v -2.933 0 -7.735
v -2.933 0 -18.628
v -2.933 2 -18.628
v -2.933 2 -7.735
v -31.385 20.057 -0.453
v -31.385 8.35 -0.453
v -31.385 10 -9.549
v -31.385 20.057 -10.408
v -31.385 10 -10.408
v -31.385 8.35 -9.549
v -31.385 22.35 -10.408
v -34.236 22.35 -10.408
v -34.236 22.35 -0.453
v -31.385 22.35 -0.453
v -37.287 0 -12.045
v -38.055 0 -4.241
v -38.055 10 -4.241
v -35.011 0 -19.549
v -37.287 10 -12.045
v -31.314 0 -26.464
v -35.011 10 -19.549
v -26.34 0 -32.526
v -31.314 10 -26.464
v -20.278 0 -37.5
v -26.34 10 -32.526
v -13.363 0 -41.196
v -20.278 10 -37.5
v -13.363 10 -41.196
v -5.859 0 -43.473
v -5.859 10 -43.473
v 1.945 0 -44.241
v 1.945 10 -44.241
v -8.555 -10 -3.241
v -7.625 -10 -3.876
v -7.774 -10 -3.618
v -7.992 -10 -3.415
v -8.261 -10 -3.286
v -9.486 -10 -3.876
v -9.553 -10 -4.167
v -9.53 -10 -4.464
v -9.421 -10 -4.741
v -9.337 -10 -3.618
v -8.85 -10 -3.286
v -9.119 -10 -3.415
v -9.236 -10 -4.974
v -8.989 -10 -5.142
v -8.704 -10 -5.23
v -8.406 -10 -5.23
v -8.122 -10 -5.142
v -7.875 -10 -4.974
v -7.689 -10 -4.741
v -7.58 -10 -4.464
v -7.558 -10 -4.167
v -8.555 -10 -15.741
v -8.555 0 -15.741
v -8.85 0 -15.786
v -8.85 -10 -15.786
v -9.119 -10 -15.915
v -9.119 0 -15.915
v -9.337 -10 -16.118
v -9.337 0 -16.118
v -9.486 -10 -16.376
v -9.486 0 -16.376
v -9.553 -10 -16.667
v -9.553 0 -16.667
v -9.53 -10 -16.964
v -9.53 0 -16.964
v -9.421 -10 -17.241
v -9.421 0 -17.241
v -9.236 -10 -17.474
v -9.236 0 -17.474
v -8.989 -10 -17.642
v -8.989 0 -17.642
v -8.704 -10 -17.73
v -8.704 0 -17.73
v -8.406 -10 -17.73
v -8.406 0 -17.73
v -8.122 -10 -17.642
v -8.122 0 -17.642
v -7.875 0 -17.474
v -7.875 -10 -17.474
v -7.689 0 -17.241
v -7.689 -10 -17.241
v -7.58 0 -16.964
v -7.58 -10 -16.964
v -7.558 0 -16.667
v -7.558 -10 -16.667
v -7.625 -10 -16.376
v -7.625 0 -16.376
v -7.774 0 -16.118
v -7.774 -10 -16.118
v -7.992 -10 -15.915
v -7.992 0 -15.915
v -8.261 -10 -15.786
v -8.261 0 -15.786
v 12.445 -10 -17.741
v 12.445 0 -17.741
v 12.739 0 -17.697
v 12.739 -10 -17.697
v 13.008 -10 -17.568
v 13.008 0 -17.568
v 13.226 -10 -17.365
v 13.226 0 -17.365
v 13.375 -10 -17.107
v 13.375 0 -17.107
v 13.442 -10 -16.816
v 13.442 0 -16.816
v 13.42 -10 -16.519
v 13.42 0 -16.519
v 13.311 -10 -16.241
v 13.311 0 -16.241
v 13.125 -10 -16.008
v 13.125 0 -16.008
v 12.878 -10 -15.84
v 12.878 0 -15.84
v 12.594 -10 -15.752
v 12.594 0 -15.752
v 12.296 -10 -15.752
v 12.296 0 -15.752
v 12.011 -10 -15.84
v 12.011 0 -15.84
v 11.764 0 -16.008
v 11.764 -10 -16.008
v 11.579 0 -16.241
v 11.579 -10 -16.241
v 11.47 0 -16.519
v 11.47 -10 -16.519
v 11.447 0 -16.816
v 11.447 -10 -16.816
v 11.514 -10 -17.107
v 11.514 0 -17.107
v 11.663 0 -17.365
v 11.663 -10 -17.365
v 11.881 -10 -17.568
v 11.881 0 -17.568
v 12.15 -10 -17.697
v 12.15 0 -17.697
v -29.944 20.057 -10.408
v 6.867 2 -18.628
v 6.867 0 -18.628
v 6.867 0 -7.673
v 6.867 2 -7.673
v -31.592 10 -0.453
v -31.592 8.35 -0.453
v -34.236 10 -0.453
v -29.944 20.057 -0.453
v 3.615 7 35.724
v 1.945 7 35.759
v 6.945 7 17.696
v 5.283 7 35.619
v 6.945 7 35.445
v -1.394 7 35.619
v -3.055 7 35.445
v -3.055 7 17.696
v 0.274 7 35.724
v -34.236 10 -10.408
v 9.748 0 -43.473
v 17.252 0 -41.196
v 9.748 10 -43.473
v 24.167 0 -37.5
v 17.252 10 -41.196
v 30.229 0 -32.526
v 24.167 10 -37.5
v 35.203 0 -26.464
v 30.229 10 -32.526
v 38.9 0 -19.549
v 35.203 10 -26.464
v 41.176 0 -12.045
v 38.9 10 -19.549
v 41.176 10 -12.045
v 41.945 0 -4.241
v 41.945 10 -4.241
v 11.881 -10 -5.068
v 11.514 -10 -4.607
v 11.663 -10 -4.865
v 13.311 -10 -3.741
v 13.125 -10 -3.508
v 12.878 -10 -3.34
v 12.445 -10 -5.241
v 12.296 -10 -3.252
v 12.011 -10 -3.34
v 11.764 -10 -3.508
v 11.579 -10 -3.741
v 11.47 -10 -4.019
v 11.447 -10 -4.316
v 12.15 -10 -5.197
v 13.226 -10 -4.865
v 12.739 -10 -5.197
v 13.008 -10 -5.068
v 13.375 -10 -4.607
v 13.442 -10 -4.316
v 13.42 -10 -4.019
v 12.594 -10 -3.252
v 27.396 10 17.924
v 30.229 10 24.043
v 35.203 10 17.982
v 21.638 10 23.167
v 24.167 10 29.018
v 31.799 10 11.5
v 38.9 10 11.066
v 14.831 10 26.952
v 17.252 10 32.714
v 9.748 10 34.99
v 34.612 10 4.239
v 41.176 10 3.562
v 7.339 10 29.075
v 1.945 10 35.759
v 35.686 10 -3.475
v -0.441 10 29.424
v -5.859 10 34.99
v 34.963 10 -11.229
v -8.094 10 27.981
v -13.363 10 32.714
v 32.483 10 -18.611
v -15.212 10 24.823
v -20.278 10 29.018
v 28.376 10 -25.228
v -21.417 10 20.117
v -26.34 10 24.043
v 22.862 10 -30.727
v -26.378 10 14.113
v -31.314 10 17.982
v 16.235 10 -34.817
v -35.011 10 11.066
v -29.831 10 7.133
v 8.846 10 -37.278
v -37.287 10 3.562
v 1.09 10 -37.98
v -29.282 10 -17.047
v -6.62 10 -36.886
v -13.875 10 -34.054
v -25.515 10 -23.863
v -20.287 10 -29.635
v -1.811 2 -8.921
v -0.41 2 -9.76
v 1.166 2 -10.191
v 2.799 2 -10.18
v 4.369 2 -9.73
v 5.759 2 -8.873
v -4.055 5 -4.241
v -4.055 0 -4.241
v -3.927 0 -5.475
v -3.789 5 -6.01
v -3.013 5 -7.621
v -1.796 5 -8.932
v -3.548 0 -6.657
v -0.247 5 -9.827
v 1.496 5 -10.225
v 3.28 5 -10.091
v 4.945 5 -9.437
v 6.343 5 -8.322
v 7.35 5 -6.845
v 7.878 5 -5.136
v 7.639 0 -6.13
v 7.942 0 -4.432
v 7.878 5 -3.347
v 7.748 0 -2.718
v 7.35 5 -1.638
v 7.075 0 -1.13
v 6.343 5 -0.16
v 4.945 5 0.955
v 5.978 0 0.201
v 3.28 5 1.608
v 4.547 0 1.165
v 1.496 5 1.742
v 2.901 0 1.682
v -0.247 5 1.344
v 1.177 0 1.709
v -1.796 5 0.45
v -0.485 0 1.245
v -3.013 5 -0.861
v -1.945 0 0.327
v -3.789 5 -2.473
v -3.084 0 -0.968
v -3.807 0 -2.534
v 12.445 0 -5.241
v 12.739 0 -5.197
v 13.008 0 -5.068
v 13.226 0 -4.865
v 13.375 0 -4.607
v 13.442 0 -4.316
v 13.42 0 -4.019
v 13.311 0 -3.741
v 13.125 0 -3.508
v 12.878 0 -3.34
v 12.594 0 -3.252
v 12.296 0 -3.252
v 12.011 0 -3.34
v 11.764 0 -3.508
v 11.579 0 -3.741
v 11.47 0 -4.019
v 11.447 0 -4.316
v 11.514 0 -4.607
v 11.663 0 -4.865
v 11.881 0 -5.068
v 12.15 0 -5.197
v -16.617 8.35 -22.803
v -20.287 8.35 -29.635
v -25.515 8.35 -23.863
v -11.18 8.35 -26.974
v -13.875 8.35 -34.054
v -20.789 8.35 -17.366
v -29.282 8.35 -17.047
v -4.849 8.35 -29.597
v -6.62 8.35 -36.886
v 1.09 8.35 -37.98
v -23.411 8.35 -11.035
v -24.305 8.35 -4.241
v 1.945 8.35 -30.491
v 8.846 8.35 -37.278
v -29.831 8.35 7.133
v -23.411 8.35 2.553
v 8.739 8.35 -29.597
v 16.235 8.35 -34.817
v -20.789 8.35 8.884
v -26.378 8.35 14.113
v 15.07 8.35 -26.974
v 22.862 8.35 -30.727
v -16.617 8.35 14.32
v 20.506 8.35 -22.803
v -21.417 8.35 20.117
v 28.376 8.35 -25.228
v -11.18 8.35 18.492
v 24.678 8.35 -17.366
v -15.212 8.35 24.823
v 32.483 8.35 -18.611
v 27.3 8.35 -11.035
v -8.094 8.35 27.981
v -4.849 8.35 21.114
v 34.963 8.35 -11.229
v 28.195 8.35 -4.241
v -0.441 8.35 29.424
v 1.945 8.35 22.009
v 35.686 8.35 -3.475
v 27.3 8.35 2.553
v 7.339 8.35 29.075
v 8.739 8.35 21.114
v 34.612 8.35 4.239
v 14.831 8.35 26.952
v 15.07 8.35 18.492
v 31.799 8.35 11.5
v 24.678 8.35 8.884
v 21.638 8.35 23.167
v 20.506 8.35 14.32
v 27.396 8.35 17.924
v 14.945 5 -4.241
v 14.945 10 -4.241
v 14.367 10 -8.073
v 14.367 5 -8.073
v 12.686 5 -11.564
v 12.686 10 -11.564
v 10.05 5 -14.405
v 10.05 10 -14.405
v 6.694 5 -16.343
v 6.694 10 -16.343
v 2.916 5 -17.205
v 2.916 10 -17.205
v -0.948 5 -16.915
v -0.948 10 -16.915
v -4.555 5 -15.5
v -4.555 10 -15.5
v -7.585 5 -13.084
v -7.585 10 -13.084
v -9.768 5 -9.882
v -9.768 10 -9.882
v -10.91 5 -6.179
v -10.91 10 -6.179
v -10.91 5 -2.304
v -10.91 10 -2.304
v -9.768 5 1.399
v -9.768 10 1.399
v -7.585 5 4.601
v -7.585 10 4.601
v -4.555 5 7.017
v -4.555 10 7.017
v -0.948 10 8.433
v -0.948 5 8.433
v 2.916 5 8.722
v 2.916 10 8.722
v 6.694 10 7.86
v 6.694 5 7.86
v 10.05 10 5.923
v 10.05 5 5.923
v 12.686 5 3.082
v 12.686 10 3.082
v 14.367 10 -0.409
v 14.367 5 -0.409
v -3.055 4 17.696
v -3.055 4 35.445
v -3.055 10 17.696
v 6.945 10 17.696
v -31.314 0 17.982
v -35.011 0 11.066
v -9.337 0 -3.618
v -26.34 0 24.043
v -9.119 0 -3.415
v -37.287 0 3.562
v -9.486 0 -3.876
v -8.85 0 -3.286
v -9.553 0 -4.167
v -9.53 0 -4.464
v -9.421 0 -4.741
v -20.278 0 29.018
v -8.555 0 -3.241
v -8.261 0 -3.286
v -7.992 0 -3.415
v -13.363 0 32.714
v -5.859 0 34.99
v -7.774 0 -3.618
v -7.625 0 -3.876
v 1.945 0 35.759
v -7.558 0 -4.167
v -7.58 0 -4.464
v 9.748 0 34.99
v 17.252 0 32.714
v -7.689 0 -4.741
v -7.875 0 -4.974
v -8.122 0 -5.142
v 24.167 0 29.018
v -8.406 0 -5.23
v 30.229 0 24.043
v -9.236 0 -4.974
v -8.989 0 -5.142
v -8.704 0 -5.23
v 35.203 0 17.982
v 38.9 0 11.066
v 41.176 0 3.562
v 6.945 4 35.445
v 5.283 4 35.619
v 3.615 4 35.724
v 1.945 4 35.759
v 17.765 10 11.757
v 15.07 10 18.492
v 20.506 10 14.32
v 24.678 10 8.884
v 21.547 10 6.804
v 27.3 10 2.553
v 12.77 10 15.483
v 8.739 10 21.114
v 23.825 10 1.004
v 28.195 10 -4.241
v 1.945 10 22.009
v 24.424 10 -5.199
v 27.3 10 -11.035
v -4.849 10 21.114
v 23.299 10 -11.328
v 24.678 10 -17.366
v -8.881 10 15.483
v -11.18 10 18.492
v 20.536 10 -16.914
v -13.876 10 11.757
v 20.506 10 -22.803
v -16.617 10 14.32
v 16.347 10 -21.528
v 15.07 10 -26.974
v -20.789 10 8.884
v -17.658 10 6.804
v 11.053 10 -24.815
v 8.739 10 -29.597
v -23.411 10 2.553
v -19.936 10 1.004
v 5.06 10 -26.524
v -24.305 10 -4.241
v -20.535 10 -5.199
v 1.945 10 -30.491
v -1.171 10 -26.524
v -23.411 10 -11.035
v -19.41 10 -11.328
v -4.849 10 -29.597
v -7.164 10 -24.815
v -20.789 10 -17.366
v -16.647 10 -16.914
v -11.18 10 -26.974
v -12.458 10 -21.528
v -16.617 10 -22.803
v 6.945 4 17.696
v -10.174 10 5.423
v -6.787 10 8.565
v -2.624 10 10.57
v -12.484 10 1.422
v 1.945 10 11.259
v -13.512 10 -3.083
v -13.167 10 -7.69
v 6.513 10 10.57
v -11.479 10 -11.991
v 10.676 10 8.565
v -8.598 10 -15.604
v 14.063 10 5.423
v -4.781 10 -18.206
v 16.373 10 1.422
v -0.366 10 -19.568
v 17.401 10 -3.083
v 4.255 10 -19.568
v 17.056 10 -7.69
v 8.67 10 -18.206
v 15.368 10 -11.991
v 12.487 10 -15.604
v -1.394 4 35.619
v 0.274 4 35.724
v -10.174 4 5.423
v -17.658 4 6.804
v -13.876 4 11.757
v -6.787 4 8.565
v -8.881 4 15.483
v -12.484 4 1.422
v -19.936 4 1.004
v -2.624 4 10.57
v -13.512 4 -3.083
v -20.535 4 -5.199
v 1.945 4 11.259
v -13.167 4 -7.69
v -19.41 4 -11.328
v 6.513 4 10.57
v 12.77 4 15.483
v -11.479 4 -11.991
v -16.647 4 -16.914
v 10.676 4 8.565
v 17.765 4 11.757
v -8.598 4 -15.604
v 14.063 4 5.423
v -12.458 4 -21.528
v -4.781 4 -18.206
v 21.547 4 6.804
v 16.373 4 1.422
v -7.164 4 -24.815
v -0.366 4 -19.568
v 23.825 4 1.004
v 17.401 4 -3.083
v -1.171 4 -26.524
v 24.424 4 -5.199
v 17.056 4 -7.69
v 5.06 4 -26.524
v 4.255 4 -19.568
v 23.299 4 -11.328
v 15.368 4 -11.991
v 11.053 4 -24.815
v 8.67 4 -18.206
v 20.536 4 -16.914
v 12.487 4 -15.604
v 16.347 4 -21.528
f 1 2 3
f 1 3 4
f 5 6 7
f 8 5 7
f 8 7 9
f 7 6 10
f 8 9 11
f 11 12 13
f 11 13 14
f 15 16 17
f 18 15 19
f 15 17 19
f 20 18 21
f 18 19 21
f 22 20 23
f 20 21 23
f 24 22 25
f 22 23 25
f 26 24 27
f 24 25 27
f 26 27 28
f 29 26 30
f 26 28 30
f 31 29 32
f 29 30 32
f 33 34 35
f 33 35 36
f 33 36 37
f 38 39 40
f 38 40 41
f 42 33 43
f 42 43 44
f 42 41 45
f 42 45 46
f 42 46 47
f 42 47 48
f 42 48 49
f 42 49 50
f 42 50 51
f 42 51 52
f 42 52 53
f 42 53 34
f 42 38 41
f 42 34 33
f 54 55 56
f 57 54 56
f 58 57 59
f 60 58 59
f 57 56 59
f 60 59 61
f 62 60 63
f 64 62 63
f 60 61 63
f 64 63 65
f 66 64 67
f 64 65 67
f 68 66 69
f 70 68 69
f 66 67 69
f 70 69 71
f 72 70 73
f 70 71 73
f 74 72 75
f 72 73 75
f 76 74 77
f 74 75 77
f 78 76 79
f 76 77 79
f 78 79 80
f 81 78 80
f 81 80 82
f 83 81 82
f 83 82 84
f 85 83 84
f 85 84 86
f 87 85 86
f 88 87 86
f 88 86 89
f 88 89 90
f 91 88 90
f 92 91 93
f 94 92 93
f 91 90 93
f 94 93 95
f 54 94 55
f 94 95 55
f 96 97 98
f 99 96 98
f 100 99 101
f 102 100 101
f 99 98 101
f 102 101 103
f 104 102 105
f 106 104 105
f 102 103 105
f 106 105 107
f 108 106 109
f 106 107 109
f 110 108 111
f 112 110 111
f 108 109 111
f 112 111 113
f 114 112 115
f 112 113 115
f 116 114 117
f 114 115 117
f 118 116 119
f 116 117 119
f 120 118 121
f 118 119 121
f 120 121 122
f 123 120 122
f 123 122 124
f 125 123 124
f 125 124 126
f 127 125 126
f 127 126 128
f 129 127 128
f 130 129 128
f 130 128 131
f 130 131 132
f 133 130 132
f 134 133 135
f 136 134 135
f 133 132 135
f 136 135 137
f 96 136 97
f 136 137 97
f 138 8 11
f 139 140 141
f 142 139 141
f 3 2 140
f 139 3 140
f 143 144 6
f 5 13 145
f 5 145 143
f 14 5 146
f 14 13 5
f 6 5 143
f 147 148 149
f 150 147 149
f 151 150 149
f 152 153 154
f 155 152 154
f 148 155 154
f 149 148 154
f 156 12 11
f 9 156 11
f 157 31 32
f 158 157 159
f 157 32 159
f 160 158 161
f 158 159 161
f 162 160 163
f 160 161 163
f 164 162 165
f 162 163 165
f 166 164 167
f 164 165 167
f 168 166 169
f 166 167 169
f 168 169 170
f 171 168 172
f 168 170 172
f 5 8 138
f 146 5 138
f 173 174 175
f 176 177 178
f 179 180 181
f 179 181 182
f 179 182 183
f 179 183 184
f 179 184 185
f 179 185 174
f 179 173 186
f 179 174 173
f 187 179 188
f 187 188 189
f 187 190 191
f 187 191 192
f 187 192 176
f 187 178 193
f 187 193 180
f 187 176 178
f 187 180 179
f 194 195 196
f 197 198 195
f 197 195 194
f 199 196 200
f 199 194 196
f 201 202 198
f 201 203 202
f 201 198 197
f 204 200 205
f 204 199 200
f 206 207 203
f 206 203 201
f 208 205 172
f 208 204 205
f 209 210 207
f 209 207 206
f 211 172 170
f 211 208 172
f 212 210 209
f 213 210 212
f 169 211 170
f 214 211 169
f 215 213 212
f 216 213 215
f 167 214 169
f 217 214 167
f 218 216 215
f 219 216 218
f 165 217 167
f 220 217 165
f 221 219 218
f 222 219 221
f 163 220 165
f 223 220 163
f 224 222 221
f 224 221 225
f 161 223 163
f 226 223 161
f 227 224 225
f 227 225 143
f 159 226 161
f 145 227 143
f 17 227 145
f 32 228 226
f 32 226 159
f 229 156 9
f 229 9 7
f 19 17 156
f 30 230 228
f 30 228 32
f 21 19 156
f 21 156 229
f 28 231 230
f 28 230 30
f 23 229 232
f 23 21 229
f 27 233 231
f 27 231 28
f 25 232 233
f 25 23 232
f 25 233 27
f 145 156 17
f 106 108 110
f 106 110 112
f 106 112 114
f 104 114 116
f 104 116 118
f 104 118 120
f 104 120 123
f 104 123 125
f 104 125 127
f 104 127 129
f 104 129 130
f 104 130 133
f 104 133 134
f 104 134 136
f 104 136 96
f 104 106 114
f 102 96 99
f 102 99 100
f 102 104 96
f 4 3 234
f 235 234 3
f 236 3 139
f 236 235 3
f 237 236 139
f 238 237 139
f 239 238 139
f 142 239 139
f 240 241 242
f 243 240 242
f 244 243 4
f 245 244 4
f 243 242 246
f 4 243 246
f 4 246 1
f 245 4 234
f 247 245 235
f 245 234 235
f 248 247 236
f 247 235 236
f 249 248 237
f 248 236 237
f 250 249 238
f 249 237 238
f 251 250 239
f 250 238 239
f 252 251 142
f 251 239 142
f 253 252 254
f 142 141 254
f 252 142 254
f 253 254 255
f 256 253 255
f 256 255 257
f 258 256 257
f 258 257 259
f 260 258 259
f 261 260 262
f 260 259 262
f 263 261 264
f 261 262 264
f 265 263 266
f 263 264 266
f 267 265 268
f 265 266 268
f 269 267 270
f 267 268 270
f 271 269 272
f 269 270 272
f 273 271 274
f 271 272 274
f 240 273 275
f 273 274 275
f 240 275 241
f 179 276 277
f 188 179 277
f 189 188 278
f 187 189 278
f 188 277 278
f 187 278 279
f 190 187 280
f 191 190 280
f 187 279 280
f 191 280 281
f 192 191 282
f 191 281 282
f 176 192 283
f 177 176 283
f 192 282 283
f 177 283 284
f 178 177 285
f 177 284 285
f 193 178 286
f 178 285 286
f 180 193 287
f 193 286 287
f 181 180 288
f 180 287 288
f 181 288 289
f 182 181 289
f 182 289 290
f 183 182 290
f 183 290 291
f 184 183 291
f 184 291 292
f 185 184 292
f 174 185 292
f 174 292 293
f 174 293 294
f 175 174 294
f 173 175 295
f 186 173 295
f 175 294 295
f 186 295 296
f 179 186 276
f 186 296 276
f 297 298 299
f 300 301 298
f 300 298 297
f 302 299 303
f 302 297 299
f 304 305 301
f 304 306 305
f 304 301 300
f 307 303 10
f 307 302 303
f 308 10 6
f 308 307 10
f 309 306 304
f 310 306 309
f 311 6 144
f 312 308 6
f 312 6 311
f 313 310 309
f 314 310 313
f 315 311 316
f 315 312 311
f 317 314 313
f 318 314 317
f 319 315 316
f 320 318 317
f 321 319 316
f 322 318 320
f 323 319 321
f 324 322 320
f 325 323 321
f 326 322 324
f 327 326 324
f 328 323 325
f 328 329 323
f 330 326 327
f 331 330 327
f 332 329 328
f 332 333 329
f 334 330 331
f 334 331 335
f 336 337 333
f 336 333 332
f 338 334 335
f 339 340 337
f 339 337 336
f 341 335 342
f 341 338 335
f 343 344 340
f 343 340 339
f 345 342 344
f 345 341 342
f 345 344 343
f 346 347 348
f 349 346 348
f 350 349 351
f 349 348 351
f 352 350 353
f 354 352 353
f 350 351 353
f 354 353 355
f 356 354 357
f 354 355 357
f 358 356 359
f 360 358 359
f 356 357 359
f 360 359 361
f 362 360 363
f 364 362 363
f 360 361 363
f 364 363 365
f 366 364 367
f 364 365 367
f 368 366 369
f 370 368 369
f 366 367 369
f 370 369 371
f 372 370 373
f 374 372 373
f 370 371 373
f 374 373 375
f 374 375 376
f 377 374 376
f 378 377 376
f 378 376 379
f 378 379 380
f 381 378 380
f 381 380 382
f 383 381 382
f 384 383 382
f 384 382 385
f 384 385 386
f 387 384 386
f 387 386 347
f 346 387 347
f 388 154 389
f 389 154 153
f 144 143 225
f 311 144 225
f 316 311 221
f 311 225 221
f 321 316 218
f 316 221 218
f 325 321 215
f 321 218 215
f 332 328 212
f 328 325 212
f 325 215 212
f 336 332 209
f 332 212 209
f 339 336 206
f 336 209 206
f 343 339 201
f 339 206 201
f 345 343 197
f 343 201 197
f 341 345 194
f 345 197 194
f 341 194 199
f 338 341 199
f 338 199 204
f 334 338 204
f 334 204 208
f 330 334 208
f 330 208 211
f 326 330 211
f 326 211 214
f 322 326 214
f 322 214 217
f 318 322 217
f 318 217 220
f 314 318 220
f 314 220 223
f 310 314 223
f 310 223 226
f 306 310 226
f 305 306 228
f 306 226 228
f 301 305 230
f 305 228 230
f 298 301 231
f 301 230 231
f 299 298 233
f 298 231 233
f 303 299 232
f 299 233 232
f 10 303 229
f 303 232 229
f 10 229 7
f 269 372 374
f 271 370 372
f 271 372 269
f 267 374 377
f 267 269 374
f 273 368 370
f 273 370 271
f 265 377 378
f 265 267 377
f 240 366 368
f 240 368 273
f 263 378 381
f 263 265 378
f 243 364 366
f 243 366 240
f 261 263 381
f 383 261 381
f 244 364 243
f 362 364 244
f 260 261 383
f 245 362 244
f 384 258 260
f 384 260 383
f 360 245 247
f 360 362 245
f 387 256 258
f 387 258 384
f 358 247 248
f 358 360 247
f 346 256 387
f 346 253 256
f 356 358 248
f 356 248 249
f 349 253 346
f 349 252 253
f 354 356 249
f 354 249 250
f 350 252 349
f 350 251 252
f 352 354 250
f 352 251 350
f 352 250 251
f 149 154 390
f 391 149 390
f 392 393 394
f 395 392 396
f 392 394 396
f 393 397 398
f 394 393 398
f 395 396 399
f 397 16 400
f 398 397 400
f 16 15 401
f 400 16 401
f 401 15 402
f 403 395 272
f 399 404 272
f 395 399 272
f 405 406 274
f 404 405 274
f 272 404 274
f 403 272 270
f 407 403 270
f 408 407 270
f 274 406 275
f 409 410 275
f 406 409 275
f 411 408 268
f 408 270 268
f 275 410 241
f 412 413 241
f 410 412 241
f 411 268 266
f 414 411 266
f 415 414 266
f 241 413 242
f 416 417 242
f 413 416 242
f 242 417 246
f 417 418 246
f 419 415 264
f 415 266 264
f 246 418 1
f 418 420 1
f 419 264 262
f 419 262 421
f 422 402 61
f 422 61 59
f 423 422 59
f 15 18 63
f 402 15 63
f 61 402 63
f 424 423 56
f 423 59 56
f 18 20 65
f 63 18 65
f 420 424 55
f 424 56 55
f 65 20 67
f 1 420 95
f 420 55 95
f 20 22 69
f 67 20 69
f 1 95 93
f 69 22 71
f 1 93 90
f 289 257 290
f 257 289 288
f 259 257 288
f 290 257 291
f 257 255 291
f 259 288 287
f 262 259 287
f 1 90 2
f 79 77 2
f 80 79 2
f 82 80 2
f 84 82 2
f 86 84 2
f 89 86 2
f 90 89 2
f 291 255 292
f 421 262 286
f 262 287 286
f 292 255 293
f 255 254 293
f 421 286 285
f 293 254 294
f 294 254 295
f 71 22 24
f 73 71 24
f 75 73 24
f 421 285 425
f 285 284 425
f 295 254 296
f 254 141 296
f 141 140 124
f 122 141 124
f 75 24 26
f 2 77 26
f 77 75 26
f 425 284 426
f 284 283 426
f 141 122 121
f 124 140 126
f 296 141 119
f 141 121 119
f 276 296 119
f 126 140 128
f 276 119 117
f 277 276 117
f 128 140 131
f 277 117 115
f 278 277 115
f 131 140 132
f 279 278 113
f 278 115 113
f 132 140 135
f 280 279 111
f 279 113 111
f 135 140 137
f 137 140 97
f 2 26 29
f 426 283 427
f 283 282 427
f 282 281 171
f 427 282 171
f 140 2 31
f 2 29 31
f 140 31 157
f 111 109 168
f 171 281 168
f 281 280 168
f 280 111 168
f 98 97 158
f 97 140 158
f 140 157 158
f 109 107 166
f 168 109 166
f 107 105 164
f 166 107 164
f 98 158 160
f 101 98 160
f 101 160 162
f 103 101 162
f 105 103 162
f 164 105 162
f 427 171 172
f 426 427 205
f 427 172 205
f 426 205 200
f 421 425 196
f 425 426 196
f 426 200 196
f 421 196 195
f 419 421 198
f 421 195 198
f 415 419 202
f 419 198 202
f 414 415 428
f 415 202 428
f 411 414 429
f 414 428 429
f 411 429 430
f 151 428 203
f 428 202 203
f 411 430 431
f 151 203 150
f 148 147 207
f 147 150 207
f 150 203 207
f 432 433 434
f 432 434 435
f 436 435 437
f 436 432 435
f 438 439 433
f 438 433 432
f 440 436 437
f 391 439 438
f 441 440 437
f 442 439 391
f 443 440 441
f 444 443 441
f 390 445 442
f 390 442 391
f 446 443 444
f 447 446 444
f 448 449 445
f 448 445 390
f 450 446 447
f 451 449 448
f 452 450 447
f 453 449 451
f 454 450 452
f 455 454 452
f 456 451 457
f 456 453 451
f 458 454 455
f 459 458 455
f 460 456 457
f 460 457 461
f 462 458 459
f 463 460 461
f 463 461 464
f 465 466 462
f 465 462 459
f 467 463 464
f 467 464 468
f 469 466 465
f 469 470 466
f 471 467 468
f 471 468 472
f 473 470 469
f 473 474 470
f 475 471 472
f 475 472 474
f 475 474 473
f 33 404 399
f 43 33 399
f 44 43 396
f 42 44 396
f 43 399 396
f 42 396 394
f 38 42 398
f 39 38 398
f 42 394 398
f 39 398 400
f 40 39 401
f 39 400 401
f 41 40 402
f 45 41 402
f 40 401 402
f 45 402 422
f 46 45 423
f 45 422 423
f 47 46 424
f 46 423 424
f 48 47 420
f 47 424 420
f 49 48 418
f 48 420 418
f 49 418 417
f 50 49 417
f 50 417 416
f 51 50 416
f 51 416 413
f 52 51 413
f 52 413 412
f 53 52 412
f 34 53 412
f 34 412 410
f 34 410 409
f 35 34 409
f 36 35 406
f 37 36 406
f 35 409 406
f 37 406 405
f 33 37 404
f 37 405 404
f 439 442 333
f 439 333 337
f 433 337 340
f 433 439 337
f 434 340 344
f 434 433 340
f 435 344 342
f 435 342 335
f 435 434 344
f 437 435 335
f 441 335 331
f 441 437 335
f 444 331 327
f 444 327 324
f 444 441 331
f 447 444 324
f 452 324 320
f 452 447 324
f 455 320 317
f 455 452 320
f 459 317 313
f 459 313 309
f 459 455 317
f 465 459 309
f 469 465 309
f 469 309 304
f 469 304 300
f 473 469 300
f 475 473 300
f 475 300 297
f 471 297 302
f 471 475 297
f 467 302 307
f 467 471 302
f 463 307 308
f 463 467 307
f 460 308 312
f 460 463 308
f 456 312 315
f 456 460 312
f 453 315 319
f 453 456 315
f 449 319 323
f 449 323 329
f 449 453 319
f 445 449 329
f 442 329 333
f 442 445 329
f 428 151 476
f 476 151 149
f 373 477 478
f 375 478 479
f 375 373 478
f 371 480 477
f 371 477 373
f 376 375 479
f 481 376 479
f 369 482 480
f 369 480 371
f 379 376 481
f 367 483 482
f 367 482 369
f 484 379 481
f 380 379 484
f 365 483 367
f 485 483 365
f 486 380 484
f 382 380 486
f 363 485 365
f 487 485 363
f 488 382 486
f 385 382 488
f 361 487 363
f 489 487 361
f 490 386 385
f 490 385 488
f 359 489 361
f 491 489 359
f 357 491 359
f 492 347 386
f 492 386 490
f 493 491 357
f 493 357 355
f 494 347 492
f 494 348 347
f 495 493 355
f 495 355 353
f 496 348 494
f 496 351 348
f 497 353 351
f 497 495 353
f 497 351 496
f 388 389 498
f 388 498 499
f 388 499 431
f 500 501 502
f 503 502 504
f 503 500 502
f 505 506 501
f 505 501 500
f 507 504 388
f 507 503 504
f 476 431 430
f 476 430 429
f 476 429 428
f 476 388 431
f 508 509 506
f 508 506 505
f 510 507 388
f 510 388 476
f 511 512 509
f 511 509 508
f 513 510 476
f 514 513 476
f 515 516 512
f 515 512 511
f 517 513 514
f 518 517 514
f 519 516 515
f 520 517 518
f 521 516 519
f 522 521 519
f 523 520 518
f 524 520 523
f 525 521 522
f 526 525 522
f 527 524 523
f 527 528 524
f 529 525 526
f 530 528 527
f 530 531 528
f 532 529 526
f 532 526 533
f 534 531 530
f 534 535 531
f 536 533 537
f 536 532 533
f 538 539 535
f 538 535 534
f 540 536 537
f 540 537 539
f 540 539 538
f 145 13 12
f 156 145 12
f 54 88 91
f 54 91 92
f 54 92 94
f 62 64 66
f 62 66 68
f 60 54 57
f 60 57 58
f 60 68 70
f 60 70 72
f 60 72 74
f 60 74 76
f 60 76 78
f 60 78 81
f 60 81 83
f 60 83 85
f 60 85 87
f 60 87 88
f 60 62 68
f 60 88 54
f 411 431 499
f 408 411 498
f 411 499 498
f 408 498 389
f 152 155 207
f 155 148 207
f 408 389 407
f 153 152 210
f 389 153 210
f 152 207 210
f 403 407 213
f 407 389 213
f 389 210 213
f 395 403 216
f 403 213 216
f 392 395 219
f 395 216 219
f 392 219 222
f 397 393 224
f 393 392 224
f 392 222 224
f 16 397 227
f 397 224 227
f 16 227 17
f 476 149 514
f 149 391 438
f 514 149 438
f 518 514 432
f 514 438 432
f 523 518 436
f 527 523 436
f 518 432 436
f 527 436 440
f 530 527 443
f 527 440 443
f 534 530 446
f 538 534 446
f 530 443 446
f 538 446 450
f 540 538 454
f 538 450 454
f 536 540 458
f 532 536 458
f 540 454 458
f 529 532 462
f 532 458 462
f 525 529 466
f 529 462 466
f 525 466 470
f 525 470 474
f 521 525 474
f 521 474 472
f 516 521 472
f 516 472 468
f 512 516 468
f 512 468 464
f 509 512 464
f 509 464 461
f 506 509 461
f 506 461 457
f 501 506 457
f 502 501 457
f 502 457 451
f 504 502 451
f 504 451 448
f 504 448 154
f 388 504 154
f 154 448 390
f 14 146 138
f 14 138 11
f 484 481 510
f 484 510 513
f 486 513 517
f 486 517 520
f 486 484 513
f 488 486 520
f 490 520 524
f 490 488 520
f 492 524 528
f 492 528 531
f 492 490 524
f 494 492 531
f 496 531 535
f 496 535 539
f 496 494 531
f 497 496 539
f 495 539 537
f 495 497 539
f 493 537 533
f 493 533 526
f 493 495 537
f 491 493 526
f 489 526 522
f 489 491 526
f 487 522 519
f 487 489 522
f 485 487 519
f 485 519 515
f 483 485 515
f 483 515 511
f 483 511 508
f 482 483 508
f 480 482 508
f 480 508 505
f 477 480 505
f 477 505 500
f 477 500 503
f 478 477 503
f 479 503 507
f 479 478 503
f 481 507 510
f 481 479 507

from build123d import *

# Parameters (mm, degrees)
SKETCH28_W                                   = 80
SKETCH28_H                                   = 80
BOSS_EXTRUDE1_DEPTH                          = 10
CBORE_FOR_M10_CHEESE_HEAD_SCREW1_D           = 12
CBORE_FOR_M10_CHEESE_HEAD_SCREW1_CBORE_D     = 26
CBORE_FOR_M10_CHEESE_HEAD_SCREW1_CBORE_DEPTH = 5
SKETCH36_R                                   = 1
BOSS_EXTRUDE5_DEPTH                          = 10
SKETCH37_R                                   = 22.5
SKETCH37_R_2                                 = 15.5
CUT_EXTRUDE2_DEPTH                           = 6
CUT_EXTRUDE6_DEPTH                           = 6
SKETCH40_W                                   = 18.062589032
SKETCH40_H                                   = 3
BOSS_EXTRUDE7_DEPTH                          = 13
SKETCH41_R                                   = 33.75
SKETCH41_R_2                                 = 26.25
CUT_EXTRUDE7_DEPTH                           = 1.65
SKETCH42_W                                   = 9.8
SKETCH42_H                                   = 11.037342061
CUT_EXTRUDE8_DEPTH                           = 2
CUT_EXTRUDE11_DEPTH                          = 20
SKETCH45_W                                   = 2.851047628
SKETCH45_H                                   = 9.955339391
BOSS_EXTRUDE8_DEPTH                          = 14
BOSS_EXTRUDE9_START                          = -9.955339
BOSS_EXTRUDE9_DEPTH                          = 9.955339


with BuildPart() as part:
    # Sketch28 → Boss-Extrude1 (new body)
    with BuildSketch(Plane(origin=(0, 0, 0), x_dir=(1, 0, 0), z_dir=(0, 1, 0))):
        with Locations((1.944585414, 4.241283073)):
            Rectangle(SKETCH28_W, SKETCH28_H)
    extrude(amount=BOSS_EXTRUDE1_DEPTH)

    # CBORE for M10 Cheese Head Screw1 (through all)
    with Locations(Plane(origin=(0, 10, 0), x_dir=(1, 0, 0), z_dir=(0, 1, 0))):
        with Locations((1.944585414, 4.241283073)):
            CounterBoreHole(CBORE_FOR_M10_CHEESE_HEAD_SCREW1_D / 2, CBORE_FOR_M10_CHEESE_HEAD_SCREW1_CBORE_D / 2, CBORE_FOR_M10_CHEESE_HEAD_SCREW1_CBORE_DEPTH)

    # Sketch36 → Boss-Extrude5 (add)
    with BuildSketch(Plane.XZ):
        with Locations(Location((12.444585414, -16.741283073, 0), (0, 0, 270))):
            Circle(SKETCH36_R)
        with Locations(Location((12.444585414, -4.241283073, 0), (0, 0, 270))):
            Circle(SKETCH36_R)
        with Locations(Location((-8.555414586, -16.741283073, 0), (0, 0, 90))):
            Circle(SKETCH36_R)
        with Locations(Location((-8.555414586, -4.241283073, 0), (0, 0, 90))):
            Circle(SKETCH36_R)
    extrude(amount=BOSS_EXTRUDE5_DEPTH)

    # Sketch37 → Cut-Extrude2 (cut)
    with BuildSketch(Plane(origin=(0, 10, 0), x_dir=(1, 0, 0), z_dir=(0, 1, 0))):
        with Locations(Location((1.944585414, 4.241283073, 0), (0, 0, 270))):
            Circle(SKETCH37_R)
        with Locations(Location((1.944585414, 4.241283073, 0), (0, 0, 270))):
            Circle(SKETCH37_R_2, mode=Mode.SUBTRACT)
    extrude(amount=-CUT_EXTRUDE2_DEPTH, mode=Mode.SUBTRACT)

    # Sketch39 → Cut-Extrude6 (cut)
    with BuildSketch(Plane(origin=(0, 10, 0), x_dir=(1, 0, 0), z_dir=(0, 1, 0))):
        with BuildLine():
            Line((6.944585414, -35.758716927), (6.944585414, -17.696127895))
            ThreePointArc((6.944585414, -17.696127895), (1.944585414, -18.258716927), (-3.055414586, -17.696127895))
            Line((-3.055414586, -17.696127895), (-3.055414586, -35.758716927))
            Line((-3.055414586, -35.758716927), (1.944585414, -35.758716927))
            Line((1.944585414, -35.758716927), (6.944585414, -35.758716927))
        make_face()
    extrude(amount=-CUT_EXTRUDE6_DEPTH, mode=Mode.SUBTRACT)

    # Sketch40 → Boss-Extrude7 (add)
    with BuildSketch(Plane(origin=(-3.055414586, 0, 0), x_dir=(0, 0, -1), z_dir=(1, 0, 0))):
        with Locations((-26.727422411, 8.5)):
            Rectangle(SKETCH40_W, SKETCH40_H)
    extrude(amount=BOSS_EXTRUDE7_DEPTH)

    # Sketch41 → Cut-Extrude7 (cut)
    with BuildSketch(Plane(origin=(0, 10, 0), x_dir=(1, 0, 0), z_dir=(0, 1, 0))):
        with Locations(Location((1.944585414, 4.241283073, 0), (0, 0, 270))):
            Circle(SKETCH41_R)
        with Locations(Location((1.944585414, 4.241283073, 0), (0, 0, 270))):
            Circle(SKETCH41_R_2, mode=Mode.SUBTRACT)
    extrude(amount=-CUT_EXTRUDE7_DEPTH, mode=Mode.SUBTRACT)

    # Sketch42 → Cut-Extrude8 (cut)
    with BuildSketch(Plane.XZ):
        with Locations((1.966640169, -13.109663986)):
            Rectangle(SKETCH42_W, SKETCH42_H)
    extrude(amount=-CUT_EXTRUDE8_DEPTH, mode=Mode.SUBTRACT)

    # Sketch43 → Cut-Extrude11 (cut)
    with BuildSketch(Plane(origin=(0, 10, 0), x_dir=(1, 0, 0), z_dir=(0, 1, 0))):
        with BuildLine():
            ThreePointArc((-38.055414586, 4.241282966), (-26.339685871, 32.525554283), (1.944585414, 44.241283073))
            Line((1.944585414, 44.241283073), (-38.055414586, 44.241283073))
            Line((-38.055414586, 44.241283073), (-38.055414586, 4.241282966))
        make_face()
        with BuildLine():
            ThreePointArc((1.944585414, -35.758716927), (-26.339685795, -24.042988212), (-38.055414586, 4.241282966))
            Line((-38.055414586, 4.241282966), (-38.055414586, -35.758716927))
            Line((-38.055414586, -35.758716927), (1.944585414, -35.758716927))
        make_face()
        with BuildLine():
            Line((41.944585414, -35.758716927), (41.944585414, 4.241283073))
            ThreePointArc((41.944585414, 4.241283073), (30.228856662, -24.042988174), (1.944585414, -35.758716927))
            Line((1.944585414, -35.758716927), (41.944585414, -35.758716927))
        make_face()
        with BuildLine():
            Line((41.944585414, 44.241283073), (1.944585414, 44.241283073))
            ThreePointArc((1.944585414, 44.241283073), (30.228856662, 32.525554321), (41.944585414, 4.241283073))
            Line((41.944585414, 4.241283073), (41.944585414, 44.241283073))
        make_face()
    extrude(amount=-CUT_EXTRUDE11_DEPTH, mode=Mode.SUBTRACT)

    # Sketch45 → Boss-Extrude8 (add)
    with BuildSketch(Plane(origin=(0, 8.35, 0), x_dir=(1, 0, 0), z_dir=(0, 1, 0))):
        with Locations((-32.810971356, 5.43037333)):
            Rectangle(SKETCH45_W, SKETCH45_H)
    extrude(amount=BOSS_EXTRUDE8_DEPTH)

    # Sketch46 → Boss-Extrude9 (add)
    with BuildSketch(Plane.XY.offset(-0.452703634).offset(BOSS_EXTRUDE9_START)):
        Polygon((-31.385447542, 22.35), (-31.385447542, 20.057188555), (-29.944471524, 20.057188555), align=None)
    extrude(amount=BOSS_EXTRUDE9_DEPTH)


solid = part.part
